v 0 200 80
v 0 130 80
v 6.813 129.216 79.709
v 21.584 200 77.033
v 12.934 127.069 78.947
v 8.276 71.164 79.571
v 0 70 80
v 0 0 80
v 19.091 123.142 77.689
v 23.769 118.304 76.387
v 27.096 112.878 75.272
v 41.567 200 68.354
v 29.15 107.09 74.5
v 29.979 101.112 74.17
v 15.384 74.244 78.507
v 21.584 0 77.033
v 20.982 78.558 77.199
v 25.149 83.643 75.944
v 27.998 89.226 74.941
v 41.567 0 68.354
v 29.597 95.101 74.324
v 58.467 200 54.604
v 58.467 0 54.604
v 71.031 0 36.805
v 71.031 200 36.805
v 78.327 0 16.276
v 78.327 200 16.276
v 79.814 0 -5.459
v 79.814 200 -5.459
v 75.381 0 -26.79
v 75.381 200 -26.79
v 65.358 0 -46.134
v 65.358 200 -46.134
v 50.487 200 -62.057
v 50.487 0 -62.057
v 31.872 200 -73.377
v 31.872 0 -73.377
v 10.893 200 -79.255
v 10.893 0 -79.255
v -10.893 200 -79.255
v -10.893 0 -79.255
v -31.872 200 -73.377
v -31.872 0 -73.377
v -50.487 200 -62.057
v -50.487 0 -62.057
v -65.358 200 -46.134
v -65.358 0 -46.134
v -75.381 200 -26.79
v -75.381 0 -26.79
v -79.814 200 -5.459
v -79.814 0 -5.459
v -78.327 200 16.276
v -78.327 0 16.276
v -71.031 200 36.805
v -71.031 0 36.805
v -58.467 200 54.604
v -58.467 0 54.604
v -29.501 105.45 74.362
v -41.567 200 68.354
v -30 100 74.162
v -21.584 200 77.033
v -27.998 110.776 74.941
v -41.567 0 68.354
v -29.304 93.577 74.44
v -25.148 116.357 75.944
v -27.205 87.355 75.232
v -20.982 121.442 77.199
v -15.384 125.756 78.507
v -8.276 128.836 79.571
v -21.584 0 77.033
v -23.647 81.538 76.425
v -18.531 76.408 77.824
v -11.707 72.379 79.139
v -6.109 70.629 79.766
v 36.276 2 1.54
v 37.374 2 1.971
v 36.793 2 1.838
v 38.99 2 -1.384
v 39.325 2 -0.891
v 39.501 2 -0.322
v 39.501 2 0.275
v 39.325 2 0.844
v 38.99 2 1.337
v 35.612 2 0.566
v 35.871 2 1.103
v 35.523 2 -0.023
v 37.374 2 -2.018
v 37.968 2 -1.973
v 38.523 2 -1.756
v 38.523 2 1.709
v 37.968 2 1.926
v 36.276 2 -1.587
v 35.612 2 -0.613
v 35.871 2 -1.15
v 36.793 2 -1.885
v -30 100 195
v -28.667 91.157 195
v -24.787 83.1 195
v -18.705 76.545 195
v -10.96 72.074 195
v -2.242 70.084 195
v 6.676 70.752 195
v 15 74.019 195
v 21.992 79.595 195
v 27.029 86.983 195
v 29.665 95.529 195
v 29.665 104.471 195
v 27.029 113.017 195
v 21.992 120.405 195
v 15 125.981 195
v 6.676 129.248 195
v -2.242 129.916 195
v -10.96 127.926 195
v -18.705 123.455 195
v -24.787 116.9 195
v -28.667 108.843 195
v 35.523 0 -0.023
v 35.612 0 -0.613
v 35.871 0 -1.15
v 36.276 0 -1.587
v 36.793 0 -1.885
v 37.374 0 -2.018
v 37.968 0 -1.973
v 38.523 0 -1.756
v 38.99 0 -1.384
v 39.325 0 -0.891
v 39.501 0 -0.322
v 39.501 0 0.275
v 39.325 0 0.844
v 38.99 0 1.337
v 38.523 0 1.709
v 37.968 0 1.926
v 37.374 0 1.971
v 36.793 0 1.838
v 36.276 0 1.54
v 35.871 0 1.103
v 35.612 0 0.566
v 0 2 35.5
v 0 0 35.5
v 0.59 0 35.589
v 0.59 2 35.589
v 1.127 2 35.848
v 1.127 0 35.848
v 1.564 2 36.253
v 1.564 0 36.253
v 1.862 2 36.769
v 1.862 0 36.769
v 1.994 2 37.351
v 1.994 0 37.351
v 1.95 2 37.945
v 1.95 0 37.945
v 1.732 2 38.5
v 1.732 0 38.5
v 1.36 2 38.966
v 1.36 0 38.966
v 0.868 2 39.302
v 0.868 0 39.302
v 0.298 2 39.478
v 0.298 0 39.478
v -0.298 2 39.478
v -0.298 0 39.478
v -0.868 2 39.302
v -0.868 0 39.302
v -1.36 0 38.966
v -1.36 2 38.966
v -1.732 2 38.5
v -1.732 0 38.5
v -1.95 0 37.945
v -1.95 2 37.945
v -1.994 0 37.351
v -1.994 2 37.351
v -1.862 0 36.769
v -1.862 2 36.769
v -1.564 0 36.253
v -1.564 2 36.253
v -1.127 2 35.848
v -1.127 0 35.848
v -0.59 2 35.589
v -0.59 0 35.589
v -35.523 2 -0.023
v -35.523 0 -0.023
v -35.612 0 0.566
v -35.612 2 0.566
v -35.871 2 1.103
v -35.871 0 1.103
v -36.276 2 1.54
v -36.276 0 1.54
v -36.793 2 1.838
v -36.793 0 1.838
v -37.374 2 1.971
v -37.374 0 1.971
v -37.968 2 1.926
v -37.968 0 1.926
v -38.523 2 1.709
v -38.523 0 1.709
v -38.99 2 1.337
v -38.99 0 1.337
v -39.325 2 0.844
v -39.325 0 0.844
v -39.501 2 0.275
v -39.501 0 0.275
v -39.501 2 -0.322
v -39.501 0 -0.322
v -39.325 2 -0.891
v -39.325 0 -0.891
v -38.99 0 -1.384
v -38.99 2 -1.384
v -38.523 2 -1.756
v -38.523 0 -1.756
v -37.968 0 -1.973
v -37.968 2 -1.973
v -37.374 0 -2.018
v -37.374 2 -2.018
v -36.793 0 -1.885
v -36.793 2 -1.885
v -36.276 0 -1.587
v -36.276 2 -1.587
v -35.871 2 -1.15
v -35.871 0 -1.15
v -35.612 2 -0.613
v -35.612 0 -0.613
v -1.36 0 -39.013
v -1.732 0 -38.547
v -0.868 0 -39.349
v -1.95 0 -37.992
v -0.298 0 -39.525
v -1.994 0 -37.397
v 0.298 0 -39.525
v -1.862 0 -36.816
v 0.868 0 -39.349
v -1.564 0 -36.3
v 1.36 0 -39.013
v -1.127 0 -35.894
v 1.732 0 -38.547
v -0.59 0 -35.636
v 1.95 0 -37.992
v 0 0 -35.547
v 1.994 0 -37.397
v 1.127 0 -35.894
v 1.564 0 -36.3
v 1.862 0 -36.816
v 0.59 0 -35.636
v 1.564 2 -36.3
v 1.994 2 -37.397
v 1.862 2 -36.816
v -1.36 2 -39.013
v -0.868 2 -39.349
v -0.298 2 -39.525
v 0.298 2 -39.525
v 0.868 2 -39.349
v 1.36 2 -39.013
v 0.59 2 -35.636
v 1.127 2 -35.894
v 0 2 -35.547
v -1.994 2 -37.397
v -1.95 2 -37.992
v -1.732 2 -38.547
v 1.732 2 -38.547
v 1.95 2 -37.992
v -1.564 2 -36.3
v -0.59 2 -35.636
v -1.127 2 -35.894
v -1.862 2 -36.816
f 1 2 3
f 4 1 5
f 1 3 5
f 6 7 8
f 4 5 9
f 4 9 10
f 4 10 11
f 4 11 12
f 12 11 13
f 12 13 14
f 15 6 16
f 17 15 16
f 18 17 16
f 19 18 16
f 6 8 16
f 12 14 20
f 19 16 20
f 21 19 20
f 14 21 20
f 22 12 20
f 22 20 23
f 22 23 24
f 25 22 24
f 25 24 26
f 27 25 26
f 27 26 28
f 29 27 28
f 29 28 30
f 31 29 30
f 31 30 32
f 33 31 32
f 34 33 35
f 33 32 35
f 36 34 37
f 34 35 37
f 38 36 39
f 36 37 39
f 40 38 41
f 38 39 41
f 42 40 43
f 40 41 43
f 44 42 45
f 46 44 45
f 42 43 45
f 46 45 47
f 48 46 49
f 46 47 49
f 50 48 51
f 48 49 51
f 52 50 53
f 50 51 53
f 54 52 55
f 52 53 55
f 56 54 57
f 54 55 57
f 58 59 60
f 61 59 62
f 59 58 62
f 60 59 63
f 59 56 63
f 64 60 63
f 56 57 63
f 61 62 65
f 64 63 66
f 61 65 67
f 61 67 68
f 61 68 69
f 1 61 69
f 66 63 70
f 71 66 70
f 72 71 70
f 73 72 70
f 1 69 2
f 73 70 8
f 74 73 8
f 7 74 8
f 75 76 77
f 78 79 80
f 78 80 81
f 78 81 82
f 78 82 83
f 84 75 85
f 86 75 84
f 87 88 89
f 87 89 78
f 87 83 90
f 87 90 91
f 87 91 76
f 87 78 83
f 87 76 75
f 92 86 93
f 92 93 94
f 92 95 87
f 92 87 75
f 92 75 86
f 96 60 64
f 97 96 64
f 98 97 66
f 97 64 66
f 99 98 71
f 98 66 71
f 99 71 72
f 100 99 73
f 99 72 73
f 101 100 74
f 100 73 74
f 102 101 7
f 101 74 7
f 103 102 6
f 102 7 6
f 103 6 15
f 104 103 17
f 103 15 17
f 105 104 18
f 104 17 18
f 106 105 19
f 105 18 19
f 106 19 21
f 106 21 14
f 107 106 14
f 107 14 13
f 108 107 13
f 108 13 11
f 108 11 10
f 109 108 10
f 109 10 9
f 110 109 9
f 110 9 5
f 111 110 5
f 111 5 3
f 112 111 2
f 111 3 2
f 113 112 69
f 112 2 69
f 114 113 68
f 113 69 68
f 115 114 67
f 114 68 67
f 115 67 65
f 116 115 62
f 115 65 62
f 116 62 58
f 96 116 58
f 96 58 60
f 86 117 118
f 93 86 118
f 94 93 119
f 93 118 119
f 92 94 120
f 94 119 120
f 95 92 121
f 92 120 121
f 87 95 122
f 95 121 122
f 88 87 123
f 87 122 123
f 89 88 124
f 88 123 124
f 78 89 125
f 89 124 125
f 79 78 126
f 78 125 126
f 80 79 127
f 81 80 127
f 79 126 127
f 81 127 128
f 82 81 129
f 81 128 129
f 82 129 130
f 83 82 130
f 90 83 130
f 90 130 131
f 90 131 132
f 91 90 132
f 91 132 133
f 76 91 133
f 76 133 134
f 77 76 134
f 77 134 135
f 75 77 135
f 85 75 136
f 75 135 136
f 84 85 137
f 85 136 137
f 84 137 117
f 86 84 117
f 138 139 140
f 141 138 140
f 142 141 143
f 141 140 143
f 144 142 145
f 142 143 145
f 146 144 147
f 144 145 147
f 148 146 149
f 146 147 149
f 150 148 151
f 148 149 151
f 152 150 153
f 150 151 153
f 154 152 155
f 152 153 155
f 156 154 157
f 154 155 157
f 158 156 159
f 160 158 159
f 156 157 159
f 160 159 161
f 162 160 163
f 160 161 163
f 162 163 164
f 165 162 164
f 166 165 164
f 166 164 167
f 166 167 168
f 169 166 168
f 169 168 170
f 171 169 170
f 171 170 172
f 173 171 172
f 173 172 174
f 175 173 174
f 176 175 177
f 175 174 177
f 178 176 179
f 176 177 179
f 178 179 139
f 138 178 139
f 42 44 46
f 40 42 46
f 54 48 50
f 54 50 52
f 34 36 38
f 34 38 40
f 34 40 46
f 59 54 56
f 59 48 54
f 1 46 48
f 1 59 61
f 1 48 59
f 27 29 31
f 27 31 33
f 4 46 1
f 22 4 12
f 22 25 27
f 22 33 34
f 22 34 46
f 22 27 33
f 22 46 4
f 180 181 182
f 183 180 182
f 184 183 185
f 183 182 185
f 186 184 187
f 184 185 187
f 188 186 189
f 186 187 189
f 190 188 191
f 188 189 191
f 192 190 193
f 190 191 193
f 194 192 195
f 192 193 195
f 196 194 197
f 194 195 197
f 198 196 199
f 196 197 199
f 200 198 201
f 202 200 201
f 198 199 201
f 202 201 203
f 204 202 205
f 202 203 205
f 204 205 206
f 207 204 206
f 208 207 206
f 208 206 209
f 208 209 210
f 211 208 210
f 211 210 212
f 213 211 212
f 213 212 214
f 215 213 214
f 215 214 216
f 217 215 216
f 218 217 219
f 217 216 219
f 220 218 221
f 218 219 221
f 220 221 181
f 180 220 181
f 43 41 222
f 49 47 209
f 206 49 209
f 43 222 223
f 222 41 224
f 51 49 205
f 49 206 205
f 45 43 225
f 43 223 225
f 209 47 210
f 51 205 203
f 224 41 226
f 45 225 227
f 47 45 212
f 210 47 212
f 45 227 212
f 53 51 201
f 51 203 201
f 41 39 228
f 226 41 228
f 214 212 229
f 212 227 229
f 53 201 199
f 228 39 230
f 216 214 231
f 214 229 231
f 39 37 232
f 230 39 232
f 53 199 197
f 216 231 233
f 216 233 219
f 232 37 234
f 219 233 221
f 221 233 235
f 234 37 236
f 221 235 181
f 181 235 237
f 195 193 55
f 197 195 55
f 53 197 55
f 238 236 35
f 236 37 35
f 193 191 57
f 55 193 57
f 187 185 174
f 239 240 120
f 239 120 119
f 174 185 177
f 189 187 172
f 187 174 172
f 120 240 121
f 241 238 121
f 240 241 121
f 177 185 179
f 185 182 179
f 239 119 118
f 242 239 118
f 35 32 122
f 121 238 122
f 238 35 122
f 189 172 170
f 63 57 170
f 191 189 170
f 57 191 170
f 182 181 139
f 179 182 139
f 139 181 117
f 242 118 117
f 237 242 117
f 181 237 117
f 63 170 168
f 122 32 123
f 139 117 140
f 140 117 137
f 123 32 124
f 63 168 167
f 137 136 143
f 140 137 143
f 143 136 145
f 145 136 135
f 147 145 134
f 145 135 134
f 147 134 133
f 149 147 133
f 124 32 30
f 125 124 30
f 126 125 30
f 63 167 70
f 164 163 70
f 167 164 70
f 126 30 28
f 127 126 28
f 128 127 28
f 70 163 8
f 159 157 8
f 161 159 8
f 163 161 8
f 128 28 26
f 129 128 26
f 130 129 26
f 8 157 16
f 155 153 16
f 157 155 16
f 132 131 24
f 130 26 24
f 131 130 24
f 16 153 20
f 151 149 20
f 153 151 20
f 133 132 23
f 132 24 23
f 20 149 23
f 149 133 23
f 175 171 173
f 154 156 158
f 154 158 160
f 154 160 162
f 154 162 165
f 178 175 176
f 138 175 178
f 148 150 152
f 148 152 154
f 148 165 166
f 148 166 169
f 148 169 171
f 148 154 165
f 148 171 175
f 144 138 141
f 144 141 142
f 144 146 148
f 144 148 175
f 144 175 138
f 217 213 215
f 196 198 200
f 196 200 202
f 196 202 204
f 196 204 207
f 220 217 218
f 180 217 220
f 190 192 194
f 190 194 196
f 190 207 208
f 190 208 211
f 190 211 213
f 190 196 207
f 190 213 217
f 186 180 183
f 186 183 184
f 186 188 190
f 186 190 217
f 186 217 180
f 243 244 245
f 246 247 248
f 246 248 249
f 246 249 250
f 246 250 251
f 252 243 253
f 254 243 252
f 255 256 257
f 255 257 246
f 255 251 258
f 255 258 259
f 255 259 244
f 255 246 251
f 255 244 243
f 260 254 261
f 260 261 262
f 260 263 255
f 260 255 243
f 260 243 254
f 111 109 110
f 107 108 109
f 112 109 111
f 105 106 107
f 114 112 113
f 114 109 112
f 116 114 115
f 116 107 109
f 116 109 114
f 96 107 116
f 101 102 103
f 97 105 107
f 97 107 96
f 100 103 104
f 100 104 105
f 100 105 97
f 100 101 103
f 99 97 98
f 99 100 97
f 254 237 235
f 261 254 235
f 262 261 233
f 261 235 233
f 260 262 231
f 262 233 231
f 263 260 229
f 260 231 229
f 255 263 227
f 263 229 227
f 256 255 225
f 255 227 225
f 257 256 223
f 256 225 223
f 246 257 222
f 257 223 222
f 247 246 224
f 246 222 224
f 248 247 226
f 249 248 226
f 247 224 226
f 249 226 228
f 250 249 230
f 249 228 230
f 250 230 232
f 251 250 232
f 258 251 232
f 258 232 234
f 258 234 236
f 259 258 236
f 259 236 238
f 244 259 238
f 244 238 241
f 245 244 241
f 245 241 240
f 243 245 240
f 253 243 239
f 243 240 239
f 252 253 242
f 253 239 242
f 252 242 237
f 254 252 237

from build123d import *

# Parameters (mm, degrees)
SKETCH_1_R               = 80
EXTRUDE_1_DEPTH          = 200
SKETCH_2_R               = 30
EXTRUDE_2_DEPTH          = 195
SKETCH_3_R               = 2
CUT_EXTRUDE_1_DEPTH      = 2
PATTERN_CIRCULAR_1_COUNT = 4


with BuildPart() as part:
    # 草图1 → 凸台-拉伸1 (new body)
    with BuildSketch(Plane(origin=(0, 0, 0), x_dir=(1, 0, 0), z_dir=(0, 1, 0))):
        with Locations(Location((0, 0, 0), (0, 0, 270))):
            Circle(SKETCH_1_R)
    extrude(amount=EXTRUDE_1_DEPTH)

    # 草图2 → 凸台-拉伸2 (add)
    with BuildSketch(Plane.XY):
        with Locations(Location((0, 100, 0), (0, 0, 180))):
            Circle(SKETCH_2_R)
    extrude(amount=EXTRUDE_2_DEPTH)

    # 草图3 → 切除-拉伸1 (cut)
    with BuildSketch(Plane.XZ):
        with Locations(Location((0, 37.5, 0), (0, 0, 270))):
            Circle(SKETCH_3_R)
    cut_extrude_1 = extrude(amount=-CUT_EXTRUDE_1_DEPTH, mode=Mode.SUBTRACT)

    # 阵列(圆周)1: 切除-拉伸1 ×4 about axis
    pattern_circular_1_axis = Axis((0, 0, -0.023452158), (0, 1, 0))
    for i in range(1, PATTERN_CIRCULAR_1_COUNT):
        add(cut_extrude_1.rotate(pattern_circular_1_axis, i * 360 / PATTERN_CIRCULAR_1_COUNT), mode=Mode.SUBTRACT)


solid = part.part
